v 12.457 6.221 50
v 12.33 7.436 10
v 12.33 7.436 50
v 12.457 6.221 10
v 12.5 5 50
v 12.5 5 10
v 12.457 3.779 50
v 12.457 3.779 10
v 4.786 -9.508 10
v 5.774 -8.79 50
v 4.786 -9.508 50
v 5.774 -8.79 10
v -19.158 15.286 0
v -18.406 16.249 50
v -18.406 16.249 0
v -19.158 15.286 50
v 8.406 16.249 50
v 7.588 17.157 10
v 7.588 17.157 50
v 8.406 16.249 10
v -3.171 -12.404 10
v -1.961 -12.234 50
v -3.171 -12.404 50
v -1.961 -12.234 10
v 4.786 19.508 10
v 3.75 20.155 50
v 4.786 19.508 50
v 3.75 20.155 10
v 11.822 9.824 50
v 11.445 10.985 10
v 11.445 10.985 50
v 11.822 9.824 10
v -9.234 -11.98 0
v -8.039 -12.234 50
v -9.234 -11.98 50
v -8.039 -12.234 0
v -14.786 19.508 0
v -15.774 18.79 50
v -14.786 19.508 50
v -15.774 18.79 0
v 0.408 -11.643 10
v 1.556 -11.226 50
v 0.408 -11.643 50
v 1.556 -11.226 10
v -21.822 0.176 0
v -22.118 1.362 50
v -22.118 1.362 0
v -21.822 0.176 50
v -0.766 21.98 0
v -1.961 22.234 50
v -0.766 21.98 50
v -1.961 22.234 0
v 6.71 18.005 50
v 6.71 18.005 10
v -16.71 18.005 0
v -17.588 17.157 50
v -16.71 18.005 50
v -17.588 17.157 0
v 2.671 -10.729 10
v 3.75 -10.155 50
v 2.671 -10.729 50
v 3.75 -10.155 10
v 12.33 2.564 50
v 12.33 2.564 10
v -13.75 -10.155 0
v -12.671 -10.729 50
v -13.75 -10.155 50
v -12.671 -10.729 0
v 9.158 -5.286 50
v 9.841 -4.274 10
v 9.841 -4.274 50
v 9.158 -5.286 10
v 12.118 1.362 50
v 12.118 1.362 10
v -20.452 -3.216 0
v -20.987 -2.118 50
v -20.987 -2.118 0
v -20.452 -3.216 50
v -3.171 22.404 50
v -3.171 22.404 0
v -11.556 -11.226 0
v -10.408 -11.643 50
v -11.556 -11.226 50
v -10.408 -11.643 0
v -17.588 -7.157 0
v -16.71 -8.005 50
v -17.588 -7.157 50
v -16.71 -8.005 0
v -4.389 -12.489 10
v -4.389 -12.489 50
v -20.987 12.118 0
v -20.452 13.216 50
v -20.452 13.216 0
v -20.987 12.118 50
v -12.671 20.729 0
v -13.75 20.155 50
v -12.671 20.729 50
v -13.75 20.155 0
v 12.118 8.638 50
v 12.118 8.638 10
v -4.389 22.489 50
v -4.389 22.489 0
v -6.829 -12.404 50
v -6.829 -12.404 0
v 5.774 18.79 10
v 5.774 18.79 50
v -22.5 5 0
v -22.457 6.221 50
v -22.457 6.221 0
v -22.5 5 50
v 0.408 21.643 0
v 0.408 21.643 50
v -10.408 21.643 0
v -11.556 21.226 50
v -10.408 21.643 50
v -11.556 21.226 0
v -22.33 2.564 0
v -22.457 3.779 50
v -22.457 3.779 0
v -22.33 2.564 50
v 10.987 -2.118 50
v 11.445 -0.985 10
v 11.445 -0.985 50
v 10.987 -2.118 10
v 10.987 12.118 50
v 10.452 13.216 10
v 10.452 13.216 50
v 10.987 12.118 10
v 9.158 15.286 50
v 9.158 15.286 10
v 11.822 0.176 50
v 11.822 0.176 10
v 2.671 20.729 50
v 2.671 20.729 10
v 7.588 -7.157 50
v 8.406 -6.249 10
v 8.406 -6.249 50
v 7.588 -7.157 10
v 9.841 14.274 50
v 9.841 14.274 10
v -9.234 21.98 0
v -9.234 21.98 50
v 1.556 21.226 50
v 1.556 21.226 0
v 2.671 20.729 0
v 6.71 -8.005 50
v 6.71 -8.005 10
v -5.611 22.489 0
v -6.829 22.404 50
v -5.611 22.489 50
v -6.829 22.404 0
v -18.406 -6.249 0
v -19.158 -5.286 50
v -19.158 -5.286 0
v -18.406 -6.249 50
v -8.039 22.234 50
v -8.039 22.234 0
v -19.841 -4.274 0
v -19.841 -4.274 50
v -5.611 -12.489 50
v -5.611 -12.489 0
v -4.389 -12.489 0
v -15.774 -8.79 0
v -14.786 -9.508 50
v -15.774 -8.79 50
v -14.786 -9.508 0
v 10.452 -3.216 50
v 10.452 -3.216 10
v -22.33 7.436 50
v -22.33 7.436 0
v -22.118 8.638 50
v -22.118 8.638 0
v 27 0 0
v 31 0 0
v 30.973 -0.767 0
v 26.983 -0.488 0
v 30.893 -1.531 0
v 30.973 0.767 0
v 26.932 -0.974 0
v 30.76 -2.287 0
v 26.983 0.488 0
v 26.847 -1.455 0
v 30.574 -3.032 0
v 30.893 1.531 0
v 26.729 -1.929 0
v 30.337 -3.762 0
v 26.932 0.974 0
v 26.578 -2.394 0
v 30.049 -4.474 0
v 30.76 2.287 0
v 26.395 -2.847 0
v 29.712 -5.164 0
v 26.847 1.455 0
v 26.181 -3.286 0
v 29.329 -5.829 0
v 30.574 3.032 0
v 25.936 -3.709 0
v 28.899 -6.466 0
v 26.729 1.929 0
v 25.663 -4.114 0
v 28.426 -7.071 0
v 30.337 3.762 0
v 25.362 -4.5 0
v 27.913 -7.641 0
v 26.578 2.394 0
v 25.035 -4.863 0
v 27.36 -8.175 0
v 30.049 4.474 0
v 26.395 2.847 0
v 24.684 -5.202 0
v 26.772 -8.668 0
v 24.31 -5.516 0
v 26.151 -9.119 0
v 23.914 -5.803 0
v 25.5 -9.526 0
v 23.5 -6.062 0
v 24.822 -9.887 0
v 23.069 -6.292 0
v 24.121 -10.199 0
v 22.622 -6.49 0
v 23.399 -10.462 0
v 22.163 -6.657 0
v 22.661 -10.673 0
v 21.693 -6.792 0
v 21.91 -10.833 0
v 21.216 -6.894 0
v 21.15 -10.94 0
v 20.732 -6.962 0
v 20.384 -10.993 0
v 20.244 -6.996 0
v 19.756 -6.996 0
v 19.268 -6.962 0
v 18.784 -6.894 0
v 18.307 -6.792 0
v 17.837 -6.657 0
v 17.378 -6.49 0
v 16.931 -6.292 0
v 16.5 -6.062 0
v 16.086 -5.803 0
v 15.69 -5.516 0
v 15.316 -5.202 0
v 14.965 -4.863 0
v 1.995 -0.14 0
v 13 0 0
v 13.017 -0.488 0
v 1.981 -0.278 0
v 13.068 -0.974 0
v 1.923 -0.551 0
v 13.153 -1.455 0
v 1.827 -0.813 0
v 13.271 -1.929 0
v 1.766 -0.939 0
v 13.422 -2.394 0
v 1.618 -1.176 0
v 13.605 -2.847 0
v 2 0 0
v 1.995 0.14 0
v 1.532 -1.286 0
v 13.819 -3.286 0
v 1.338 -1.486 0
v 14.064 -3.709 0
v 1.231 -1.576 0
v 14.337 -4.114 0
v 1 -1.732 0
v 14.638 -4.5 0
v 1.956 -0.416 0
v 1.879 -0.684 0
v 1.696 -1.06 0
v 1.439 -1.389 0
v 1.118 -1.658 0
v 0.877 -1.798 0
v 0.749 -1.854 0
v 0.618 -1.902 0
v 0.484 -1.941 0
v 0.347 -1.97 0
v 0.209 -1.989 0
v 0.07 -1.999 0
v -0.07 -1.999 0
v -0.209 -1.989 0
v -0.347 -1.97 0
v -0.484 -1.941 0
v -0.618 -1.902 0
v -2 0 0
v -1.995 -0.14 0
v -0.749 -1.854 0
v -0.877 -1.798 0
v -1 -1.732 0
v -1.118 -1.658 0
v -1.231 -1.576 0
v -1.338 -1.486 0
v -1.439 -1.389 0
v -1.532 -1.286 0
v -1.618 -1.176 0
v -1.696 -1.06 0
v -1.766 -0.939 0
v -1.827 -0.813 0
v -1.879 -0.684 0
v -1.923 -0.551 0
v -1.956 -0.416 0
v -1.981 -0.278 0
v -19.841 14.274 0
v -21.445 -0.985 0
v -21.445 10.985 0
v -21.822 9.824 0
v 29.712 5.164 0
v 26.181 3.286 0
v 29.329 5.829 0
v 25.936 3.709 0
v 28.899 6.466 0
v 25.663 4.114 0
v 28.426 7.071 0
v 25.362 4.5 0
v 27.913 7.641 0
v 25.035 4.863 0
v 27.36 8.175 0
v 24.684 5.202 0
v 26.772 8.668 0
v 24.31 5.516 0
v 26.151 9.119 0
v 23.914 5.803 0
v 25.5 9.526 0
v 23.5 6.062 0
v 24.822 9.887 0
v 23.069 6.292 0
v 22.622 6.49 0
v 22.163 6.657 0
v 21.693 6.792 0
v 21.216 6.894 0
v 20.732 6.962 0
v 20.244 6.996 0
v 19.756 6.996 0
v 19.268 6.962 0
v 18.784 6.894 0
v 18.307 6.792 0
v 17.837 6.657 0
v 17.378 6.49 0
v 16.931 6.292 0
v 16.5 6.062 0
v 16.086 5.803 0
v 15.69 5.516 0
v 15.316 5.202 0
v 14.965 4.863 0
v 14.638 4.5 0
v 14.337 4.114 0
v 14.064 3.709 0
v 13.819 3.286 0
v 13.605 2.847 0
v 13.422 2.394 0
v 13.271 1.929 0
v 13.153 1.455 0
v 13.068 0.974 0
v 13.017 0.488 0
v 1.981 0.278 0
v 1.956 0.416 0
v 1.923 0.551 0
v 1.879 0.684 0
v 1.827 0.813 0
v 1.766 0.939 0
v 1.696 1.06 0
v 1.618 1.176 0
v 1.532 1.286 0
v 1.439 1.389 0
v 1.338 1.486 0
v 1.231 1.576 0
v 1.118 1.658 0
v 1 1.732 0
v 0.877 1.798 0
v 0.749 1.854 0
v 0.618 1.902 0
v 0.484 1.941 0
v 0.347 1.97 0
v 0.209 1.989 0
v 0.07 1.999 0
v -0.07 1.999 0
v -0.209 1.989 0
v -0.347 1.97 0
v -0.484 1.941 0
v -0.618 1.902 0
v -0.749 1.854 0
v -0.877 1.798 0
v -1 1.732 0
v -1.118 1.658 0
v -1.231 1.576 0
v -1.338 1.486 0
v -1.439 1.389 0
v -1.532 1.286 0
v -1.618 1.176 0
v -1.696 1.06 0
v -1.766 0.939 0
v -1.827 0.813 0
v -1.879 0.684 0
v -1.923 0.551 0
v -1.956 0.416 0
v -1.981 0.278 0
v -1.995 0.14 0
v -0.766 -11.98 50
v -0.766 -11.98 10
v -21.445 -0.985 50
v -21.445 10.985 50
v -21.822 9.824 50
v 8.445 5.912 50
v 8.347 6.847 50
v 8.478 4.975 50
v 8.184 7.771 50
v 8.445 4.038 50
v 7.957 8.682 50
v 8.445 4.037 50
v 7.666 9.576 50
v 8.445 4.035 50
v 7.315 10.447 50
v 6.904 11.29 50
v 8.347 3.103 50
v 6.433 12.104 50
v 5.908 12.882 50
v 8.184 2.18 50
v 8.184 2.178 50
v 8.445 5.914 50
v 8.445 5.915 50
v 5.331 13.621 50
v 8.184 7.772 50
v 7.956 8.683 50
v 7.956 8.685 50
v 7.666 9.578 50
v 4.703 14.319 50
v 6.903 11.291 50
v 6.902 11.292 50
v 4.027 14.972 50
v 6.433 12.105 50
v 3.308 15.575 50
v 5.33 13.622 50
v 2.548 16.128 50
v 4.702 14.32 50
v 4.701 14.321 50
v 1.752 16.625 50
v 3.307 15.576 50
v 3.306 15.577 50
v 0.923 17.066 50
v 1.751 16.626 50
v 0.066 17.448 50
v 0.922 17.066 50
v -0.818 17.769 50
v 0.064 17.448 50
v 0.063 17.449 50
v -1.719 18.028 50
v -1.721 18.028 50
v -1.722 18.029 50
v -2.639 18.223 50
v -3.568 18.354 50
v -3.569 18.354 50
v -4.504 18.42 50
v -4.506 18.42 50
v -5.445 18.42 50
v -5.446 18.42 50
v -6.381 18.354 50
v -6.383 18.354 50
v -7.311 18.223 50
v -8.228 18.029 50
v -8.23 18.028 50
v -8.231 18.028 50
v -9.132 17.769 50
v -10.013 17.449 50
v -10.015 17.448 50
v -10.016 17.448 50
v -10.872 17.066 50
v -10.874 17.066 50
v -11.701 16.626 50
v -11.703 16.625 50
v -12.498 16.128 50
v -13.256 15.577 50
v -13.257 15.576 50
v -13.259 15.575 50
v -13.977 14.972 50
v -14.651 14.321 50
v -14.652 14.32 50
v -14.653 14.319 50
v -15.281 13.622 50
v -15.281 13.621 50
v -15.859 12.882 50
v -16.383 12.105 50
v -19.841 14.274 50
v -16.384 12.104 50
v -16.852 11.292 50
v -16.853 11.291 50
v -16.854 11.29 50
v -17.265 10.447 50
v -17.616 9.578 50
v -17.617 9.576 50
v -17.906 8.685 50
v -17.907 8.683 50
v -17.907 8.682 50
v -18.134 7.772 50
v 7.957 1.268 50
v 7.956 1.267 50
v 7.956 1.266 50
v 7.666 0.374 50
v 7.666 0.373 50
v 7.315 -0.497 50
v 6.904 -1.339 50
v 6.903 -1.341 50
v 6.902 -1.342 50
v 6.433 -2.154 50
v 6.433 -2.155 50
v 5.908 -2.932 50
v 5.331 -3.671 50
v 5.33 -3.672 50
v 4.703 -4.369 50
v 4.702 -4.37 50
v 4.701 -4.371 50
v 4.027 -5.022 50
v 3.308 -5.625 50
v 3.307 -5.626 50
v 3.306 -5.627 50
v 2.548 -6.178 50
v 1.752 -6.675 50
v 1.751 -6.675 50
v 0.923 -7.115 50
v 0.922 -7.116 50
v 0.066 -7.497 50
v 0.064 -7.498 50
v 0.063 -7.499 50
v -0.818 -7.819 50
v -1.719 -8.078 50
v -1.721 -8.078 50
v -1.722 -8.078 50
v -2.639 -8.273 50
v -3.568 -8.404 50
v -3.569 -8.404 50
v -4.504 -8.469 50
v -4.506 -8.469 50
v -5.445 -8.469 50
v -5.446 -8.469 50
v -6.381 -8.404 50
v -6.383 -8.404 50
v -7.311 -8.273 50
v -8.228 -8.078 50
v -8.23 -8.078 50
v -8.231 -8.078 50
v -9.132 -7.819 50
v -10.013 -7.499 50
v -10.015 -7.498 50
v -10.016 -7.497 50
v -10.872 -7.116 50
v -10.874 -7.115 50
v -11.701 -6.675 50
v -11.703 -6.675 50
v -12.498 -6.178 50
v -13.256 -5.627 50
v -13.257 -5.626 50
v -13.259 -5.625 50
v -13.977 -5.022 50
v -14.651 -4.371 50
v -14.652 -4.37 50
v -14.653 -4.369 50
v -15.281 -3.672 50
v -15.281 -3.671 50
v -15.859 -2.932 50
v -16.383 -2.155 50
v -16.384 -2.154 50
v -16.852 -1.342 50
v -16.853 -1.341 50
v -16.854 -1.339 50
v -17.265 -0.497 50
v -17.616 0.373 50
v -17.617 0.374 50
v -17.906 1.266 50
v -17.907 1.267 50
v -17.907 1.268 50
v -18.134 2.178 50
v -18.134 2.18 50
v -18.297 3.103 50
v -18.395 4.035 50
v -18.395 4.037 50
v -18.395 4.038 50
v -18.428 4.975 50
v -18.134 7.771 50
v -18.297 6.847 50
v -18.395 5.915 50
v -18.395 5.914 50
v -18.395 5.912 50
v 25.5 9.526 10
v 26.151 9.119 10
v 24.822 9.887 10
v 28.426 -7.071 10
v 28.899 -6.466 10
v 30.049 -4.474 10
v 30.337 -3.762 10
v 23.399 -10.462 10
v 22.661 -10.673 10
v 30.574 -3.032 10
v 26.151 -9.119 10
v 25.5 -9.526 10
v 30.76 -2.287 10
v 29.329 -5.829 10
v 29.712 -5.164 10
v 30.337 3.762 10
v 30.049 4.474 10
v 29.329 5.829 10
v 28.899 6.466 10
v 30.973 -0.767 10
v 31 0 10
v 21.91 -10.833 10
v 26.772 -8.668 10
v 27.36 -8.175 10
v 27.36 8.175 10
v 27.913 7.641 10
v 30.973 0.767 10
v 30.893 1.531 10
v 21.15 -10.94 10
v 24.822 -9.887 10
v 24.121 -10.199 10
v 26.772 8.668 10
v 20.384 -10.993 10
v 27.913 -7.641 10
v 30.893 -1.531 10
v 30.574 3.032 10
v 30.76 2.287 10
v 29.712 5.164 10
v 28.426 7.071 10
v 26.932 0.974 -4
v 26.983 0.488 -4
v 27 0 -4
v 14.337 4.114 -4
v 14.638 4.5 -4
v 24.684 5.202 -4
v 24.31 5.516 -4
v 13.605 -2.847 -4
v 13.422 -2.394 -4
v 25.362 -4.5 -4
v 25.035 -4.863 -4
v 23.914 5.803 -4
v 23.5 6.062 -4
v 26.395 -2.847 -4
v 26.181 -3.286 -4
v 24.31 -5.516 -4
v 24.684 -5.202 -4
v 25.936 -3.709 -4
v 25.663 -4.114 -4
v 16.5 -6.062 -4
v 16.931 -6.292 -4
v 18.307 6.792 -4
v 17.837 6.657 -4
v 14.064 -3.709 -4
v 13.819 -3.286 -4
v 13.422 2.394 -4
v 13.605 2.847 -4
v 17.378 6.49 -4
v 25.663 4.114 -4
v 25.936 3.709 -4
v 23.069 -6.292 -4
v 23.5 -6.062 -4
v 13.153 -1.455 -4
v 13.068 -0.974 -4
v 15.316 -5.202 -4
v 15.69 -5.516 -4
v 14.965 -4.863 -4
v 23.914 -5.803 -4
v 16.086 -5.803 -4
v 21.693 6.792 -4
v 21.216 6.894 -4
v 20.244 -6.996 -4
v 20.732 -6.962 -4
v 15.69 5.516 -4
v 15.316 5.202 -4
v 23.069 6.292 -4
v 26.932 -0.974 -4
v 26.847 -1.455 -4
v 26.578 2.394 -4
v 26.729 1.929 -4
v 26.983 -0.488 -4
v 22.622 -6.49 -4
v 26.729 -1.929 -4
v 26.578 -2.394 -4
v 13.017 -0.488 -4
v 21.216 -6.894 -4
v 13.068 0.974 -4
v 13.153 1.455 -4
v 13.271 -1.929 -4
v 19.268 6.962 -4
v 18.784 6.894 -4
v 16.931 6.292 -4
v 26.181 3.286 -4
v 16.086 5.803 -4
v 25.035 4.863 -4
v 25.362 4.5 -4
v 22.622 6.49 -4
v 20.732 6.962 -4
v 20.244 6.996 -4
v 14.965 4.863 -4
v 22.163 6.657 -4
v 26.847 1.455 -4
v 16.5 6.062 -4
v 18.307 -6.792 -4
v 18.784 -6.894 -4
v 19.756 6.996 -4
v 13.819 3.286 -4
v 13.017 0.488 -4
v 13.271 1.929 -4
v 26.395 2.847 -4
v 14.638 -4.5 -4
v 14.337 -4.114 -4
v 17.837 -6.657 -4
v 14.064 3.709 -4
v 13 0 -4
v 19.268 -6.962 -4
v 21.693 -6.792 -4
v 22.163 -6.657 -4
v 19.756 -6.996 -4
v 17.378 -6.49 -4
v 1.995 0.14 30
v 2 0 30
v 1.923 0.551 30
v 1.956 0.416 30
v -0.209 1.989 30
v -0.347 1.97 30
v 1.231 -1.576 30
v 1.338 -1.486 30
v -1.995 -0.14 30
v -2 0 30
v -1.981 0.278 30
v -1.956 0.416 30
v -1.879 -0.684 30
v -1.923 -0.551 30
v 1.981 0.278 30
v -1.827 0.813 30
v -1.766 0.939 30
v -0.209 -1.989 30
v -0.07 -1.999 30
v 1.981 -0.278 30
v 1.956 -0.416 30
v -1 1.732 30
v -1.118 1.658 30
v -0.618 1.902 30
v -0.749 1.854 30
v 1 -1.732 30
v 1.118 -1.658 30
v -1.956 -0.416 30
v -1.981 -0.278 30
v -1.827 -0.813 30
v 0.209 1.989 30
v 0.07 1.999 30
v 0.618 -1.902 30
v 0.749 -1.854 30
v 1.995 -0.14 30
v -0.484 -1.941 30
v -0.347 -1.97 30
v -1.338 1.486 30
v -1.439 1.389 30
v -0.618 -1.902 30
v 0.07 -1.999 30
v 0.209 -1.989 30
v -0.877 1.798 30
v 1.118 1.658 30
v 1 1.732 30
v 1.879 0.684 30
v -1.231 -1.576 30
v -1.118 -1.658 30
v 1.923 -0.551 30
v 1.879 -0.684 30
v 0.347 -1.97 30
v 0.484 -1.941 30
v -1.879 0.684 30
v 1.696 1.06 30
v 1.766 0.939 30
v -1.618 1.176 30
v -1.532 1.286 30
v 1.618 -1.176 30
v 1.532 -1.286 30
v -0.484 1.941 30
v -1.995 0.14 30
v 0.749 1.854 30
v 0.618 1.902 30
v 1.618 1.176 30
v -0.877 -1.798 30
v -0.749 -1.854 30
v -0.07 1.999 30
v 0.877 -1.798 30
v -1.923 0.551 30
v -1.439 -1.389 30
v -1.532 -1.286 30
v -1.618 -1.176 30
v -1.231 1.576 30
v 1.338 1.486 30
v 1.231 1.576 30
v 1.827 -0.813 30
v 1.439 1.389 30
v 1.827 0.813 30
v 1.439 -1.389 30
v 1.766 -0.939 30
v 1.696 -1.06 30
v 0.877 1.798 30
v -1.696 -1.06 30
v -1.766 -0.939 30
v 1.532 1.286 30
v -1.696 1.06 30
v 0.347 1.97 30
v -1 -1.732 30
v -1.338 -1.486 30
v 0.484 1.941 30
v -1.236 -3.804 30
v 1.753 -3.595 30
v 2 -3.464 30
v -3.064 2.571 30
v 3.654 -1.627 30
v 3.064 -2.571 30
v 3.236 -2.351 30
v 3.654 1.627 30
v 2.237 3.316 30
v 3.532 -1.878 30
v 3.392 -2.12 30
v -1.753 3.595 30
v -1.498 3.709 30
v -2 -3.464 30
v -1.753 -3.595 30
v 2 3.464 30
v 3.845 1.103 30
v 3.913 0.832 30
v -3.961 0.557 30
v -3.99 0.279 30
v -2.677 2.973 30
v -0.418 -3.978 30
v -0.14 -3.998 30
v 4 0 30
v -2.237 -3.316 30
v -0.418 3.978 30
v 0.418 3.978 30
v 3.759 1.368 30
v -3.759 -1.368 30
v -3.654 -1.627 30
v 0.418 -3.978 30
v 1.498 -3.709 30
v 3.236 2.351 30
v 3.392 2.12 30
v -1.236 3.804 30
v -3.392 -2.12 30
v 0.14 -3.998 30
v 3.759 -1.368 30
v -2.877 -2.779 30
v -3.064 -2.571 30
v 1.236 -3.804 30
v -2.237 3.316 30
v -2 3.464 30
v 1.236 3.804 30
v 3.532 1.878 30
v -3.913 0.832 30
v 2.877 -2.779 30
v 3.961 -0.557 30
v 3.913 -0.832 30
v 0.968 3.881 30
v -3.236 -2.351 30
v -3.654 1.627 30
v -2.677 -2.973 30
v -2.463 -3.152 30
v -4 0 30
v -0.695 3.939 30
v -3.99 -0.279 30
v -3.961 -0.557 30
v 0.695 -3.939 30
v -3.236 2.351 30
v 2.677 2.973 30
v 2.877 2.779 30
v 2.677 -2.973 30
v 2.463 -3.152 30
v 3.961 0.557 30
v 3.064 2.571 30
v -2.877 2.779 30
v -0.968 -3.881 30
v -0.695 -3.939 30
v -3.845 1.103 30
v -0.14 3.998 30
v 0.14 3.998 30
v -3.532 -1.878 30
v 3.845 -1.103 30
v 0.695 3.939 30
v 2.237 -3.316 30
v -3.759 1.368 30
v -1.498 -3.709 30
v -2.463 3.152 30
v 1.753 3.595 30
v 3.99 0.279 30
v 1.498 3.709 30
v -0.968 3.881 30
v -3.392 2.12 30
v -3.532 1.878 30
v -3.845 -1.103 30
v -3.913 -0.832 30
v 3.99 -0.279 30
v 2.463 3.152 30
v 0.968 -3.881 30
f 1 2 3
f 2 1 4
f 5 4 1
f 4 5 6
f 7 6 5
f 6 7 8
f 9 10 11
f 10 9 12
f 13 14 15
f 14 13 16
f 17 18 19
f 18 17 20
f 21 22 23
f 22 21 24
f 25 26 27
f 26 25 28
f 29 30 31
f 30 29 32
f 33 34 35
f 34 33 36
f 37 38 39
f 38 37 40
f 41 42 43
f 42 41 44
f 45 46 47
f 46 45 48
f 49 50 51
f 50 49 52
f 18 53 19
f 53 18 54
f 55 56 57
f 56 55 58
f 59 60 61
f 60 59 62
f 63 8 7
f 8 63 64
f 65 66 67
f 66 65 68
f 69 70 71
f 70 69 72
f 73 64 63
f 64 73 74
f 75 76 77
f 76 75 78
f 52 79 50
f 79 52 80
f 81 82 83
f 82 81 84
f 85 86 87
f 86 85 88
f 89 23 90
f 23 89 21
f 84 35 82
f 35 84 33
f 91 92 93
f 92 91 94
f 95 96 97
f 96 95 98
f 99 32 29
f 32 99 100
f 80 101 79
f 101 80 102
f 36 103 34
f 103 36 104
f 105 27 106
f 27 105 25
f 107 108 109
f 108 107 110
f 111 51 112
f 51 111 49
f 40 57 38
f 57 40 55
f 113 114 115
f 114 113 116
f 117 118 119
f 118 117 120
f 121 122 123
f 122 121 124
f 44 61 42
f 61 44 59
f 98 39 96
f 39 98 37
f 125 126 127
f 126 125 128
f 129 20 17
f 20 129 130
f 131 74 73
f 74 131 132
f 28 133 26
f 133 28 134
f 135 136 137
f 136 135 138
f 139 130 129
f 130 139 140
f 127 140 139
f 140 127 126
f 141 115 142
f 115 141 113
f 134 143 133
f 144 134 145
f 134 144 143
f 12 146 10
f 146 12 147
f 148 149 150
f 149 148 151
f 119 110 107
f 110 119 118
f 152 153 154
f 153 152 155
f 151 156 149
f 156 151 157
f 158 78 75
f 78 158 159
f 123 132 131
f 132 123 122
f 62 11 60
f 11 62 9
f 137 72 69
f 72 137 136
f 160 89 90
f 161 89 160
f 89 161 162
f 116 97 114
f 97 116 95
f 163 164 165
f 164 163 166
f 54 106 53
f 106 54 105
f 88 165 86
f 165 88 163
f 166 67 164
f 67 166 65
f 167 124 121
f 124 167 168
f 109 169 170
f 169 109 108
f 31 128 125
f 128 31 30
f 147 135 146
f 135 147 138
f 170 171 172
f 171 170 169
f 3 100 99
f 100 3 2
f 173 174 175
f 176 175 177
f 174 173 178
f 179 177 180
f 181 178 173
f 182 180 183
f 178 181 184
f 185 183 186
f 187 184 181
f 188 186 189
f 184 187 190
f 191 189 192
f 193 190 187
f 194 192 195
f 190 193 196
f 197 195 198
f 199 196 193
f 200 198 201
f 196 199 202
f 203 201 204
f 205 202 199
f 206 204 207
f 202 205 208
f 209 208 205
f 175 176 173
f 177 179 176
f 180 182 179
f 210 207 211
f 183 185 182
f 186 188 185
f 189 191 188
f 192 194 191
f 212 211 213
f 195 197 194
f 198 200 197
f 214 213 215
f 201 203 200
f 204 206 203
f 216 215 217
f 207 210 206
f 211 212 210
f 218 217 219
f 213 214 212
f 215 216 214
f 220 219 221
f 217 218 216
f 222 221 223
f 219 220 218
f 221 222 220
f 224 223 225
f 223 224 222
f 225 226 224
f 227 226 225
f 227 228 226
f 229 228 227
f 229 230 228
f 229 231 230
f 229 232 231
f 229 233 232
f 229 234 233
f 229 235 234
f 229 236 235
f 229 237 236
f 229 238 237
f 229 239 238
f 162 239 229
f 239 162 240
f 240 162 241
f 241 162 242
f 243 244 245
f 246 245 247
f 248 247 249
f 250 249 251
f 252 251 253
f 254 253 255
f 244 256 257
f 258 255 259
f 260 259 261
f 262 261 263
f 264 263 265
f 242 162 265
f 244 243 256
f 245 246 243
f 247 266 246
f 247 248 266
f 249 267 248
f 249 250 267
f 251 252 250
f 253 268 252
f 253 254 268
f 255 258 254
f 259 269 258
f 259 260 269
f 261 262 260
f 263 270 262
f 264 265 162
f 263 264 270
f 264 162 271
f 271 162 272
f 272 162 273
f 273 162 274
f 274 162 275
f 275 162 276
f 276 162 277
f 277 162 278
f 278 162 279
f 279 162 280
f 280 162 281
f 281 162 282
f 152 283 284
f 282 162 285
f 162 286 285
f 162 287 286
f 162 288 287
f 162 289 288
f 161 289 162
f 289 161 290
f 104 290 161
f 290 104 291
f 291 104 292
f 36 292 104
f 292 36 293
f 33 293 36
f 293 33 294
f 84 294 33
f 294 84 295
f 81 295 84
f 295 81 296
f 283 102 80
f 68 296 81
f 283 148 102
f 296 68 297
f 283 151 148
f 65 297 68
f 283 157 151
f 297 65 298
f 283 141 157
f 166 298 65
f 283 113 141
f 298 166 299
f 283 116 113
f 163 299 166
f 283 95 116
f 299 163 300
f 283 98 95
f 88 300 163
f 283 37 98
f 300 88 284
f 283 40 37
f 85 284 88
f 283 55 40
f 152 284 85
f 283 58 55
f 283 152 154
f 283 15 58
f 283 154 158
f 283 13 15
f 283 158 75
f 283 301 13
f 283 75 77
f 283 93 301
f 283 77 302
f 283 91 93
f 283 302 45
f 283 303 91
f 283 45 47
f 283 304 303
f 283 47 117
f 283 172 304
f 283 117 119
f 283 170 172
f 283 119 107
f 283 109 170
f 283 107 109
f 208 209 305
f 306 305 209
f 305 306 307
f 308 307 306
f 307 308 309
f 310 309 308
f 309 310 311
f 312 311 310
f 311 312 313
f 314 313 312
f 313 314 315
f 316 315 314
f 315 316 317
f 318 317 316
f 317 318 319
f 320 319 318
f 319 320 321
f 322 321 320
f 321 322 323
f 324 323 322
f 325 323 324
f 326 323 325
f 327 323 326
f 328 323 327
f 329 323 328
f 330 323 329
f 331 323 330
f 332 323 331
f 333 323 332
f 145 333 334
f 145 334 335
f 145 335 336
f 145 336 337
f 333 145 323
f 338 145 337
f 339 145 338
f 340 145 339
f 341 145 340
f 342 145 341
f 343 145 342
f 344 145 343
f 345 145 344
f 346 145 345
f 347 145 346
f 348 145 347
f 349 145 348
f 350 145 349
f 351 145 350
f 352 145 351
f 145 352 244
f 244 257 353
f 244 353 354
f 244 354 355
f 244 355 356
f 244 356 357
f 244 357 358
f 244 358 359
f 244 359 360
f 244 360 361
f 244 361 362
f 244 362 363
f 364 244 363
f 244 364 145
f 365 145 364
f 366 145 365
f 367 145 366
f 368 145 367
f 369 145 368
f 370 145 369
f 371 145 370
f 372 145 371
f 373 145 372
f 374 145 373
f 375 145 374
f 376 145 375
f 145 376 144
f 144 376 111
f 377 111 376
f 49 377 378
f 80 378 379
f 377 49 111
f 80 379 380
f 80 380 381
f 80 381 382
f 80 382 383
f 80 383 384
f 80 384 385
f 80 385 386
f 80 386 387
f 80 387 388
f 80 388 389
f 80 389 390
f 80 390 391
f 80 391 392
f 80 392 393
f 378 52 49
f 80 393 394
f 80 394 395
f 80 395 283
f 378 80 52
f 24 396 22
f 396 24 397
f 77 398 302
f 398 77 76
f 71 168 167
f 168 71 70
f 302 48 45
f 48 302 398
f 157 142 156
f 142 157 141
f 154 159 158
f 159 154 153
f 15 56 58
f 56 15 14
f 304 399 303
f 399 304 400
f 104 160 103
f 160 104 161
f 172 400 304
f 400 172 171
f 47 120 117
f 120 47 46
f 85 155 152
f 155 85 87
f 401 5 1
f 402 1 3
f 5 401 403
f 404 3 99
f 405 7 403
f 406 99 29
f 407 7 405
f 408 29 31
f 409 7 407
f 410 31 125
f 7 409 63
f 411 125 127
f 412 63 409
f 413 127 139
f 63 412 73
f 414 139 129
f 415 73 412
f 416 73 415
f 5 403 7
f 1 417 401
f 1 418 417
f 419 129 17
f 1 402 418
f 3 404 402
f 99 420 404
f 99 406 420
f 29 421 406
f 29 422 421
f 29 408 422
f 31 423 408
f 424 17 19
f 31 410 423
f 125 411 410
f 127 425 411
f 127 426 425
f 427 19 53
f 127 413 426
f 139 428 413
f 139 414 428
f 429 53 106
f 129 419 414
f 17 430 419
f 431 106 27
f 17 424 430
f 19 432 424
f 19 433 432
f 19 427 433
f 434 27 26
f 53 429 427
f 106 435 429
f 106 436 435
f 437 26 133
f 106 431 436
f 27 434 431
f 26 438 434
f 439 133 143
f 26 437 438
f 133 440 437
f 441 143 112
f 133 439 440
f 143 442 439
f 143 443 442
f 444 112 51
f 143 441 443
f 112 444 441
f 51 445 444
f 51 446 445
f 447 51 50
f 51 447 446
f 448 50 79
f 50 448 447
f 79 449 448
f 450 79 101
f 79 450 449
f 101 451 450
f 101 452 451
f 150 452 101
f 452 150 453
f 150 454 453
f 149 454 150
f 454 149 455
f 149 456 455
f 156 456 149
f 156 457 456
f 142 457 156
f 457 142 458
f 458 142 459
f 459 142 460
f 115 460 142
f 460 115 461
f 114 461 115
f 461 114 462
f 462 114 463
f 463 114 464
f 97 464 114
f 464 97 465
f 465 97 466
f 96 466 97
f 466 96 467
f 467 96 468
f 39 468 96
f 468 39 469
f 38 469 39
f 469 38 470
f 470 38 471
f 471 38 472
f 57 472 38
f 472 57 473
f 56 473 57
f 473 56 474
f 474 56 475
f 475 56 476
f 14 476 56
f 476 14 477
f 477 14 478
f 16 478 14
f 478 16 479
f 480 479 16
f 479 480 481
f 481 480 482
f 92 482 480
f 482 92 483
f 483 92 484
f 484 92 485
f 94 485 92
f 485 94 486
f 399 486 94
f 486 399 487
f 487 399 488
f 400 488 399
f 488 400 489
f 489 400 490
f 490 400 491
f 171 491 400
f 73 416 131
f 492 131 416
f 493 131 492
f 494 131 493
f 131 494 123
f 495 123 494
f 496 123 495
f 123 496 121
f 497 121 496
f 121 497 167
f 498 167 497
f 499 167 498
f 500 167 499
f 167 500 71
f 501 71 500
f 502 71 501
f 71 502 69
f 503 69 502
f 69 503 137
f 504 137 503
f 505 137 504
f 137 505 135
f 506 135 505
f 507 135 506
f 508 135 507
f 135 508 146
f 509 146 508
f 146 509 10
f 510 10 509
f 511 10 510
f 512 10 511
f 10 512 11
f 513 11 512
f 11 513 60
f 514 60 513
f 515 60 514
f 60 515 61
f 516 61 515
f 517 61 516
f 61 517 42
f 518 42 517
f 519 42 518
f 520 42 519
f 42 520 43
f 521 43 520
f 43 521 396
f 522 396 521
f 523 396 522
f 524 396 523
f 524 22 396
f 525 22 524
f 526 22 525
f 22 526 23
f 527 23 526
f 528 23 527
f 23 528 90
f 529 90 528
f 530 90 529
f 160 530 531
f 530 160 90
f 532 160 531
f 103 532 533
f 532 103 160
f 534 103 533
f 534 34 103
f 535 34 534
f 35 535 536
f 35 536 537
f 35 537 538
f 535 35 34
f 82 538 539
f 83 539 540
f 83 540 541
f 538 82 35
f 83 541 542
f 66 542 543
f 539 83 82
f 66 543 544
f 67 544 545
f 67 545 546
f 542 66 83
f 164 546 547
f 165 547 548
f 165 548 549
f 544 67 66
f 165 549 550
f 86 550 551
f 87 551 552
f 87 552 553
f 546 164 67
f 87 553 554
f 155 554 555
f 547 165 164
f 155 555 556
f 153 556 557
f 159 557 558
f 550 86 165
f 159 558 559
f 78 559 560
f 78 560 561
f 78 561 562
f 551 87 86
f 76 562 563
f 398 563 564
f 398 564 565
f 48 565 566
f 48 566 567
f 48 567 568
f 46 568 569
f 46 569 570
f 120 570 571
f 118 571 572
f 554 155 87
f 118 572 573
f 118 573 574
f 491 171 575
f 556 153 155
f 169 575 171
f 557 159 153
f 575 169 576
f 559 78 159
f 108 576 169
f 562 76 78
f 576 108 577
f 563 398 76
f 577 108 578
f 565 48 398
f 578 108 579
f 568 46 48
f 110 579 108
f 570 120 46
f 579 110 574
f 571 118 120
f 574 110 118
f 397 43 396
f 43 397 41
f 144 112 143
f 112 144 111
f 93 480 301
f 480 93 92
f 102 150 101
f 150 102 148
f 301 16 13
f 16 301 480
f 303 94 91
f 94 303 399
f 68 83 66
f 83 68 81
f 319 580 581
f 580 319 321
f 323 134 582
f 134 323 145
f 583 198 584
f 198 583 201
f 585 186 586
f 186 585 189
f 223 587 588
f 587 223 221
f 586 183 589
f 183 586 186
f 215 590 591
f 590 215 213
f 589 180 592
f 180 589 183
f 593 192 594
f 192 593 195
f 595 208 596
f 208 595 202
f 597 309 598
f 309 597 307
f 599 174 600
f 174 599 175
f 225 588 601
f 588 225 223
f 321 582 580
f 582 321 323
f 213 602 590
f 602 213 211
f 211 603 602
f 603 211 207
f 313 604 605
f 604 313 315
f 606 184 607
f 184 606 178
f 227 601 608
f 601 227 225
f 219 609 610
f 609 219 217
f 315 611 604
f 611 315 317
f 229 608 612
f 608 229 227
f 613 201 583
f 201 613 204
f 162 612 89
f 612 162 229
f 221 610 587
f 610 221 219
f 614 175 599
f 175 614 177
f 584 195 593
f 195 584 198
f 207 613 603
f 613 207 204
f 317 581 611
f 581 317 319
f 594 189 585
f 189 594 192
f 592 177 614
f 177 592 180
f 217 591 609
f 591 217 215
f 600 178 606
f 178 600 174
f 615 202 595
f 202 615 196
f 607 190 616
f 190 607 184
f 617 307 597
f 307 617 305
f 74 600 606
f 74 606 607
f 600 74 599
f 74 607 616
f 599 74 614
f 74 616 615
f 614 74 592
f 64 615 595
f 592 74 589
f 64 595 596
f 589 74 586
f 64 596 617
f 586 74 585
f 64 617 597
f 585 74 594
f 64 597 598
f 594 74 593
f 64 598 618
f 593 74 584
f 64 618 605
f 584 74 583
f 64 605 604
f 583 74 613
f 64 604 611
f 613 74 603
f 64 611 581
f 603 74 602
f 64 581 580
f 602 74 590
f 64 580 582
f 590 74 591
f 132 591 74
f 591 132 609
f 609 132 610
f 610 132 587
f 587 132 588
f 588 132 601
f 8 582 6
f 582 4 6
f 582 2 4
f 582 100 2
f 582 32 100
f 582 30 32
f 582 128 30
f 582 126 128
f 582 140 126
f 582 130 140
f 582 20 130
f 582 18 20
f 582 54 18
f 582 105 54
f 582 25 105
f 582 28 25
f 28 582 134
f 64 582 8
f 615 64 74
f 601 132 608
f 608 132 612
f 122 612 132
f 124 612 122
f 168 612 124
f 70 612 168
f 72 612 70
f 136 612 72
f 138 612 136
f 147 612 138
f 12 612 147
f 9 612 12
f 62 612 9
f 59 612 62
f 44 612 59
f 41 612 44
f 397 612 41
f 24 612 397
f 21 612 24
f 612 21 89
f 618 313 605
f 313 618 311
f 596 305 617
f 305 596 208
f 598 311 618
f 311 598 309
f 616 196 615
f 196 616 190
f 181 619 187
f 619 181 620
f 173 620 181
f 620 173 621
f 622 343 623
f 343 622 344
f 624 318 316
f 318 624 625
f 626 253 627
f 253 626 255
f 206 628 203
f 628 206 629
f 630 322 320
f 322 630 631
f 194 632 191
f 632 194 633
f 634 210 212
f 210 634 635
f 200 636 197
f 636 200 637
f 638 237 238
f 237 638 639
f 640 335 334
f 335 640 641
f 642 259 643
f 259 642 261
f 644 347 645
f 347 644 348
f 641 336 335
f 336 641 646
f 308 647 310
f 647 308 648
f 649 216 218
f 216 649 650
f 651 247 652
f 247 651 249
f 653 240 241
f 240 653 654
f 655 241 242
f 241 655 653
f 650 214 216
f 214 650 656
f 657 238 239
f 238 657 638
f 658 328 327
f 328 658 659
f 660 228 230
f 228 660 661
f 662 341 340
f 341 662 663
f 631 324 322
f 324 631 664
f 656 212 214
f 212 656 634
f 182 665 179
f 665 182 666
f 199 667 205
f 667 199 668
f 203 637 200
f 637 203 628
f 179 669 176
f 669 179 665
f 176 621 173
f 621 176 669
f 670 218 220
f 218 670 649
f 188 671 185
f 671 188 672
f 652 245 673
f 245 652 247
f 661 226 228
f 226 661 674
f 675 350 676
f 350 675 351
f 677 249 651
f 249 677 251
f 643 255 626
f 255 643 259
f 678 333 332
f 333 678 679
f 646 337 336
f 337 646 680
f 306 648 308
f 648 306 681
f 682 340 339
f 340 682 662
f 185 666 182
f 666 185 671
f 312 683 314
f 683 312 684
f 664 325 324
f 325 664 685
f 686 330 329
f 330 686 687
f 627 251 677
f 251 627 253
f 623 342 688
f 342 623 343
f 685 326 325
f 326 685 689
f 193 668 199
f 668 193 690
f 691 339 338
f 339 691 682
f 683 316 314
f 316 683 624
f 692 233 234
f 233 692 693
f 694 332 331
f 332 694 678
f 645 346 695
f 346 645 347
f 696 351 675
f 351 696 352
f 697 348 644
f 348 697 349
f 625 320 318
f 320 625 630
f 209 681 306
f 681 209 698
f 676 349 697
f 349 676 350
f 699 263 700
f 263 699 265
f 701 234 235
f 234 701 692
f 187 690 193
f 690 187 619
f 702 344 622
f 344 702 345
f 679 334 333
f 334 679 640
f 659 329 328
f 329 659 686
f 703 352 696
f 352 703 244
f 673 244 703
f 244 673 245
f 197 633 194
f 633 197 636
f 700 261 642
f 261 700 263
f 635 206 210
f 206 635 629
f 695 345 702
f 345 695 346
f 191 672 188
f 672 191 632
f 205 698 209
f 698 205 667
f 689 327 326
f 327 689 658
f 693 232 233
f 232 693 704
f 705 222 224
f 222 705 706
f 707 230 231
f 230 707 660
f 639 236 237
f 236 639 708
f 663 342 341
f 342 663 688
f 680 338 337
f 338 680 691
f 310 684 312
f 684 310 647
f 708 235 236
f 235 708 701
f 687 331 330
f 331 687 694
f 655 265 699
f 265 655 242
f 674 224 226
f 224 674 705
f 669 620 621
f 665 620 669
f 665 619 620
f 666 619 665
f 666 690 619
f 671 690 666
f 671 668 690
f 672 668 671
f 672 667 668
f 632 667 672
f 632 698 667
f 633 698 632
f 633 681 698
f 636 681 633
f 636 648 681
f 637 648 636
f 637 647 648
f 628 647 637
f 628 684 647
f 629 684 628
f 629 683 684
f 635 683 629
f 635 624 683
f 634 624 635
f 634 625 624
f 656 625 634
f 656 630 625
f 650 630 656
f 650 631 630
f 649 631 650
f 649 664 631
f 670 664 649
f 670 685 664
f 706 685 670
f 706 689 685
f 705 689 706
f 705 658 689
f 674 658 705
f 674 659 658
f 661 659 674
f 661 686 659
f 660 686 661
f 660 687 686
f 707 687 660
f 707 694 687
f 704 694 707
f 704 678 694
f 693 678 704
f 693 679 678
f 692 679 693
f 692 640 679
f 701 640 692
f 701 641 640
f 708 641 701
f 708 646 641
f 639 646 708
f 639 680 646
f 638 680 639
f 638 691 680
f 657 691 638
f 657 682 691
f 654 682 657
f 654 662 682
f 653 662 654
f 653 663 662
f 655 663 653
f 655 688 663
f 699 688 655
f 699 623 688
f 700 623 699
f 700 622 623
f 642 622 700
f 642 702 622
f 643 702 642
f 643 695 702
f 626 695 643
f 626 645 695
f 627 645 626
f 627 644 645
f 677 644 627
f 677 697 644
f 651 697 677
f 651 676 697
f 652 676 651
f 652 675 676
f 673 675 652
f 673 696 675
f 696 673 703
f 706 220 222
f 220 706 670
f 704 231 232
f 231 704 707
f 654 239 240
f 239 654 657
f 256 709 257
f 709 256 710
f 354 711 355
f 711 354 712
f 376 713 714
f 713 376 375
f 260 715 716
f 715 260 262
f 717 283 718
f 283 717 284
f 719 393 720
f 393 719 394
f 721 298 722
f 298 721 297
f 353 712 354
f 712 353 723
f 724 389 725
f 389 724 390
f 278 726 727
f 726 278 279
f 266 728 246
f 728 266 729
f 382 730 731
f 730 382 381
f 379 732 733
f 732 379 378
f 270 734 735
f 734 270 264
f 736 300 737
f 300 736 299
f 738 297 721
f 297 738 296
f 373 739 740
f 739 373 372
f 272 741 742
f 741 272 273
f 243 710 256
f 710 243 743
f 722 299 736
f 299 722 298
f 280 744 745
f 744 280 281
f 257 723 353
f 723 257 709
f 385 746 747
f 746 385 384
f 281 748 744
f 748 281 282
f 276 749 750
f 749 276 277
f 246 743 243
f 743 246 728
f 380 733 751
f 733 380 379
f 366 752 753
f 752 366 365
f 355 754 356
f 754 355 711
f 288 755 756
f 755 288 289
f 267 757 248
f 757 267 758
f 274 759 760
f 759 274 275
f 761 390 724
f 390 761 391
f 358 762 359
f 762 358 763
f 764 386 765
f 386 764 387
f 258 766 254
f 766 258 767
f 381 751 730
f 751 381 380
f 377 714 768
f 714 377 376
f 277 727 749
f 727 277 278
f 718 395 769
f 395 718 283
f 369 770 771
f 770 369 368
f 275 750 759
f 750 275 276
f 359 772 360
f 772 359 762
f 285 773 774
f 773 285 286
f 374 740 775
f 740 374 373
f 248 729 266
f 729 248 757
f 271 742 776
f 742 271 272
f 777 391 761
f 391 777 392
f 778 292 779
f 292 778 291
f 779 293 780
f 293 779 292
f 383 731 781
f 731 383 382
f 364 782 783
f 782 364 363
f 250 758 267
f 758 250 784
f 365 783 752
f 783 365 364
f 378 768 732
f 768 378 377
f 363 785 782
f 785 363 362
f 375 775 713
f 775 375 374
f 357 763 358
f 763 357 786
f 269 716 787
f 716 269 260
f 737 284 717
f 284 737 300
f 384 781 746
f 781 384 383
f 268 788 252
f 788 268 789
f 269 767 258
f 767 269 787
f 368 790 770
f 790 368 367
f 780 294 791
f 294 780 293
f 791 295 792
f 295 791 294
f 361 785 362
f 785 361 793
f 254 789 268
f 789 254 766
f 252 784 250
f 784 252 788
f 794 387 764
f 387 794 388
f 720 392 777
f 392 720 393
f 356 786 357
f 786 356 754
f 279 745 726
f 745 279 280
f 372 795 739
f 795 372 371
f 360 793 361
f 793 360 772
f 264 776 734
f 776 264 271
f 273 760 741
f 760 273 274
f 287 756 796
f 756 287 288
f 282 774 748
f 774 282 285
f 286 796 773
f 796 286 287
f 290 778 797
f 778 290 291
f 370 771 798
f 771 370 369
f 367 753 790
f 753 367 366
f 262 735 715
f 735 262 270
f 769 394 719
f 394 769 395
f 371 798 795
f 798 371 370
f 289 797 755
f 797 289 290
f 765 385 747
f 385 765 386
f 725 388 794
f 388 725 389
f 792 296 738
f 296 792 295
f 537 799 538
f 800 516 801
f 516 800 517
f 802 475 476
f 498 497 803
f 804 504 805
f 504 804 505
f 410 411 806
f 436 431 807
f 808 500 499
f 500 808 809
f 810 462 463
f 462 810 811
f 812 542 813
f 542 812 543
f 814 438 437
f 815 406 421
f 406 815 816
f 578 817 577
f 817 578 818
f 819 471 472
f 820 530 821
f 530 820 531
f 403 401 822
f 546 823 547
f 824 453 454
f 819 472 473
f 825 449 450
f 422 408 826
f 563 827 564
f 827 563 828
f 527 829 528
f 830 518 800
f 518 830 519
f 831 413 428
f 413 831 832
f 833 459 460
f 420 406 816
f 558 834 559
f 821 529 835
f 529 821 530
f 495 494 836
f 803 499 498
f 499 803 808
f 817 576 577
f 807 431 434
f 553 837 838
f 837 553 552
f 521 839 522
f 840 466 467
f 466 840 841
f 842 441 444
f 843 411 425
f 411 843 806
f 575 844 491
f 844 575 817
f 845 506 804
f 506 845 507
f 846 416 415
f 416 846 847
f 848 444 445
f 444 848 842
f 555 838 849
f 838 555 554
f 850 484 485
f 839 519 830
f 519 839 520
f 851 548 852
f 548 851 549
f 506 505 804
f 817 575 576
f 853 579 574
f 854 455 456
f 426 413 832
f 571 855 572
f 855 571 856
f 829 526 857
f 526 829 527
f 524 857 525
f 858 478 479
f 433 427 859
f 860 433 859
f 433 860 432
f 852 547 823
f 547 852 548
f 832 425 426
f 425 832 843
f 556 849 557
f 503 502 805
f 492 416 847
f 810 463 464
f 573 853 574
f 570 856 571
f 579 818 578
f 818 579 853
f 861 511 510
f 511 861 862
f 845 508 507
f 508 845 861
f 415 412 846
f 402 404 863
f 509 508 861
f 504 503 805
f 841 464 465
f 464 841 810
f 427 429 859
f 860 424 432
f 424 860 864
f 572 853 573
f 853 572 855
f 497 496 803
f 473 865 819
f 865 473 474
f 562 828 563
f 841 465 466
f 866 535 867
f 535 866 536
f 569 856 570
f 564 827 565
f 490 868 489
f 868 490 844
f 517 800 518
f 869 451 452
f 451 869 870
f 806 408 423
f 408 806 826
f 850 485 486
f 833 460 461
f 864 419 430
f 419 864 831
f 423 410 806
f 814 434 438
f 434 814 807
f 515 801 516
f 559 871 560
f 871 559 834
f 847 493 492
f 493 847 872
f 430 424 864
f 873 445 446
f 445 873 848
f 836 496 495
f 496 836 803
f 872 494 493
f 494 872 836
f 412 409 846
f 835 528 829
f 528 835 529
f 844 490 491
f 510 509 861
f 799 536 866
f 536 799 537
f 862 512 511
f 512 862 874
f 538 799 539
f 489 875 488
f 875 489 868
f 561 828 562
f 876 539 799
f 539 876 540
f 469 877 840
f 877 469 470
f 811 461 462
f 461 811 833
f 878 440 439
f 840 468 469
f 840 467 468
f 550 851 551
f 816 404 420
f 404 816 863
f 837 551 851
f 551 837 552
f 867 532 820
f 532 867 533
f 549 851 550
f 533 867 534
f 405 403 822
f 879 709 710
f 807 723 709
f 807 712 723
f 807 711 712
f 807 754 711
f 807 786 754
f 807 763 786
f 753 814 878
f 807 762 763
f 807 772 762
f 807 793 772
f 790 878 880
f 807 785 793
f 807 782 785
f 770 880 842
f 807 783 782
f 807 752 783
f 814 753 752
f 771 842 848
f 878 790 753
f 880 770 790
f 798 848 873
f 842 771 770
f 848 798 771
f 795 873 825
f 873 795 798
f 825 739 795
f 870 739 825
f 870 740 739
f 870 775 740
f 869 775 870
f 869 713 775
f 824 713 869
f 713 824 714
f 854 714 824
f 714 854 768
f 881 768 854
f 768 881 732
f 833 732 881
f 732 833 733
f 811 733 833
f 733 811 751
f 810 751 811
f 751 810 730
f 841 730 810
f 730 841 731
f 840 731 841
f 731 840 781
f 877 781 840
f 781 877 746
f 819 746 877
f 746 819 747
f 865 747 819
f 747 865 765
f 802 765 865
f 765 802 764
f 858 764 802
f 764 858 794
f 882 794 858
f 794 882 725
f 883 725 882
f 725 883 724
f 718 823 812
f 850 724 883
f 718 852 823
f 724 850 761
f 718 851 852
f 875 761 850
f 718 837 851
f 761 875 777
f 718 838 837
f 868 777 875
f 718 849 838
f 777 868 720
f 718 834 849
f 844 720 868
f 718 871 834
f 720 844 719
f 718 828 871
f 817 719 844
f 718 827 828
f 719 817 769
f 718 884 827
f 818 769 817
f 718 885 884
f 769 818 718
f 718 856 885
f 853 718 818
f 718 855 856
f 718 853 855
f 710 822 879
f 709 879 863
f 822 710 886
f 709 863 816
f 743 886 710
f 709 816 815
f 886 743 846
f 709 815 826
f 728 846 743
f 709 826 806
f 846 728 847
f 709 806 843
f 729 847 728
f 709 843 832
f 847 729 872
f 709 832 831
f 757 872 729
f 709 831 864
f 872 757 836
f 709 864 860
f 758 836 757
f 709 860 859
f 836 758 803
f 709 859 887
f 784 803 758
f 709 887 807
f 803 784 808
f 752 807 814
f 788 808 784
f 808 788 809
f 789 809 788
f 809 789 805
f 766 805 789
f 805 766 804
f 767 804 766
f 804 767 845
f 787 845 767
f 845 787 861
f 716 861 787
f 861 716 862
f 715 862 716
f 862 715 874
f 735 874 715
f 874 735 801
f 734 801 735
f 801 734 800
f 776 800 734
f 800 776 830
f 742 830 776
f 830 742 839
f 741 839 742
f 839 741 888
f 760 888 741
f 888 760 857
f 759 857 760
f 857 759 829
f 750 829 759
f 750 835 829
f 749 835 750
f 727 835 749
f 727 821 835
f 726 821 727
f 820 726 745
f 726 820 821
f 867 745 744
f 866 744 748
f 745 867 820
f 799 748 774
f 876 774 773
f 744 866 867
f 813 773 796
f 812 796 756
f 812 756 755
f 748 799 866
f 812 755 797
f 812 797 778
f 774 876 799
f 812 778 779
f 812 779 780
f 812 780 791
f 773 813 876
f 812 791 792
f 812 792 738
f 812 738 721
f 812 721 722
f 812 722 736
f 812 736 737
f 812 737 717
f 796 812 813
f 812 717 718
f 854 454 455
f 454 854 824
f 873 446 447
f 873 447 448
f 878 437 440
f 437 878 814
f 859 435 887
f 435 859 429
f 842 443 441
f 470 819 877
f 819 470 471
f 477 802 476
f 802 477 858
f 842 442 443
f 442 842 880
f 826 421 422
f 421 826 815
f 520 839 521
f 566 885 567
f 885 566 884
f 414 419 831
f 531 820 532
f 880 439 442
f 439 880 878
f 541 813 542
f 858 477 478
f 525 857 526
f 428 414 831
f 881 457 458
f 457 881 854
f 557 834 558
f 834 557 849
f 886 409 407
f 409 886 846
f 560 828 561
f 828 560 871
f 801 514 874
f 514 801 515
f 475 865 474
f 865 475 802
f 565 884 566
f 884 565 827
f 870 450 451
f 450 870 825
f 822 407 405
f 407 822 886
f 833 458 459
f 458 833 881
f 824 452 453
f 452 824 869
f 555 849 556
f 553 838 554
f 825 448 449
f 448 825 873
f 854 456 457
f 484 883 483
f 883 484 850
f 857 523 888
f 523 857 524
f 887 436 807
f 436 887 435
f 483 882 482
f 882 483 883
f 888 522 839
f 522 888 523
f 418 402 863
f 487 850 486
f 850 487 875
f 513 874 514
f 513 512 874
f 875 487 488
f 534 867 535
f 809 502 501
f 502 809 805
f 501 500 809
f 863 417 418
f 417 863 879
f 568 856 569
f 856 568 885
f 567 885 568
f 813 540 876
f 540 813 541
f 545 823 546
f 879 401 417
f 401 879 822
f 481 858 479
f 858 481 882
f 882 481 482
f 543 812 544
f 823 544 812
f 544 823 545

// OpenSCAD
small_bolt=4;
large_bolt=14;
pad=0.1;

large_bolt_offset=[20,0];
bar_offset=[-5,5];

support_width=10;
large_wall=4;
large_od=large_bolt+large_wall*2;

large_grip=4;
screw_length=30;
screw_head=8;
lip=screw_head/2;

bar=35;

width=50;
$fn=90;
zero=0.001;

module positive() {
	translate(bar_offset)
	cylinder(d=bar,h=width);
	hull() {
		translate(bar_offset)
		cylinder(d=bar,h=support_width);
		translate(large_bolt_offset)
		cylinder(d=large_od,h=support_width);
	}
	translate([0,0,-large_grip])
	translate(large_bolt_offset)
	cylinder(d=large_bolt,h=large_grip+pad);
}

difference() {
	positive();
	translate([0,0,-pad])
	cylinder(d=small_bolt,h=width+pad*2);

	hull() {
		translate([0,0,screw_length])
		cylinder(d=screw_head,h=zero);
		translate(bar_offset)
		translate([0,0,width+pad])
		cylinder(d=bar-lip*2,h=zero);
	}
}
